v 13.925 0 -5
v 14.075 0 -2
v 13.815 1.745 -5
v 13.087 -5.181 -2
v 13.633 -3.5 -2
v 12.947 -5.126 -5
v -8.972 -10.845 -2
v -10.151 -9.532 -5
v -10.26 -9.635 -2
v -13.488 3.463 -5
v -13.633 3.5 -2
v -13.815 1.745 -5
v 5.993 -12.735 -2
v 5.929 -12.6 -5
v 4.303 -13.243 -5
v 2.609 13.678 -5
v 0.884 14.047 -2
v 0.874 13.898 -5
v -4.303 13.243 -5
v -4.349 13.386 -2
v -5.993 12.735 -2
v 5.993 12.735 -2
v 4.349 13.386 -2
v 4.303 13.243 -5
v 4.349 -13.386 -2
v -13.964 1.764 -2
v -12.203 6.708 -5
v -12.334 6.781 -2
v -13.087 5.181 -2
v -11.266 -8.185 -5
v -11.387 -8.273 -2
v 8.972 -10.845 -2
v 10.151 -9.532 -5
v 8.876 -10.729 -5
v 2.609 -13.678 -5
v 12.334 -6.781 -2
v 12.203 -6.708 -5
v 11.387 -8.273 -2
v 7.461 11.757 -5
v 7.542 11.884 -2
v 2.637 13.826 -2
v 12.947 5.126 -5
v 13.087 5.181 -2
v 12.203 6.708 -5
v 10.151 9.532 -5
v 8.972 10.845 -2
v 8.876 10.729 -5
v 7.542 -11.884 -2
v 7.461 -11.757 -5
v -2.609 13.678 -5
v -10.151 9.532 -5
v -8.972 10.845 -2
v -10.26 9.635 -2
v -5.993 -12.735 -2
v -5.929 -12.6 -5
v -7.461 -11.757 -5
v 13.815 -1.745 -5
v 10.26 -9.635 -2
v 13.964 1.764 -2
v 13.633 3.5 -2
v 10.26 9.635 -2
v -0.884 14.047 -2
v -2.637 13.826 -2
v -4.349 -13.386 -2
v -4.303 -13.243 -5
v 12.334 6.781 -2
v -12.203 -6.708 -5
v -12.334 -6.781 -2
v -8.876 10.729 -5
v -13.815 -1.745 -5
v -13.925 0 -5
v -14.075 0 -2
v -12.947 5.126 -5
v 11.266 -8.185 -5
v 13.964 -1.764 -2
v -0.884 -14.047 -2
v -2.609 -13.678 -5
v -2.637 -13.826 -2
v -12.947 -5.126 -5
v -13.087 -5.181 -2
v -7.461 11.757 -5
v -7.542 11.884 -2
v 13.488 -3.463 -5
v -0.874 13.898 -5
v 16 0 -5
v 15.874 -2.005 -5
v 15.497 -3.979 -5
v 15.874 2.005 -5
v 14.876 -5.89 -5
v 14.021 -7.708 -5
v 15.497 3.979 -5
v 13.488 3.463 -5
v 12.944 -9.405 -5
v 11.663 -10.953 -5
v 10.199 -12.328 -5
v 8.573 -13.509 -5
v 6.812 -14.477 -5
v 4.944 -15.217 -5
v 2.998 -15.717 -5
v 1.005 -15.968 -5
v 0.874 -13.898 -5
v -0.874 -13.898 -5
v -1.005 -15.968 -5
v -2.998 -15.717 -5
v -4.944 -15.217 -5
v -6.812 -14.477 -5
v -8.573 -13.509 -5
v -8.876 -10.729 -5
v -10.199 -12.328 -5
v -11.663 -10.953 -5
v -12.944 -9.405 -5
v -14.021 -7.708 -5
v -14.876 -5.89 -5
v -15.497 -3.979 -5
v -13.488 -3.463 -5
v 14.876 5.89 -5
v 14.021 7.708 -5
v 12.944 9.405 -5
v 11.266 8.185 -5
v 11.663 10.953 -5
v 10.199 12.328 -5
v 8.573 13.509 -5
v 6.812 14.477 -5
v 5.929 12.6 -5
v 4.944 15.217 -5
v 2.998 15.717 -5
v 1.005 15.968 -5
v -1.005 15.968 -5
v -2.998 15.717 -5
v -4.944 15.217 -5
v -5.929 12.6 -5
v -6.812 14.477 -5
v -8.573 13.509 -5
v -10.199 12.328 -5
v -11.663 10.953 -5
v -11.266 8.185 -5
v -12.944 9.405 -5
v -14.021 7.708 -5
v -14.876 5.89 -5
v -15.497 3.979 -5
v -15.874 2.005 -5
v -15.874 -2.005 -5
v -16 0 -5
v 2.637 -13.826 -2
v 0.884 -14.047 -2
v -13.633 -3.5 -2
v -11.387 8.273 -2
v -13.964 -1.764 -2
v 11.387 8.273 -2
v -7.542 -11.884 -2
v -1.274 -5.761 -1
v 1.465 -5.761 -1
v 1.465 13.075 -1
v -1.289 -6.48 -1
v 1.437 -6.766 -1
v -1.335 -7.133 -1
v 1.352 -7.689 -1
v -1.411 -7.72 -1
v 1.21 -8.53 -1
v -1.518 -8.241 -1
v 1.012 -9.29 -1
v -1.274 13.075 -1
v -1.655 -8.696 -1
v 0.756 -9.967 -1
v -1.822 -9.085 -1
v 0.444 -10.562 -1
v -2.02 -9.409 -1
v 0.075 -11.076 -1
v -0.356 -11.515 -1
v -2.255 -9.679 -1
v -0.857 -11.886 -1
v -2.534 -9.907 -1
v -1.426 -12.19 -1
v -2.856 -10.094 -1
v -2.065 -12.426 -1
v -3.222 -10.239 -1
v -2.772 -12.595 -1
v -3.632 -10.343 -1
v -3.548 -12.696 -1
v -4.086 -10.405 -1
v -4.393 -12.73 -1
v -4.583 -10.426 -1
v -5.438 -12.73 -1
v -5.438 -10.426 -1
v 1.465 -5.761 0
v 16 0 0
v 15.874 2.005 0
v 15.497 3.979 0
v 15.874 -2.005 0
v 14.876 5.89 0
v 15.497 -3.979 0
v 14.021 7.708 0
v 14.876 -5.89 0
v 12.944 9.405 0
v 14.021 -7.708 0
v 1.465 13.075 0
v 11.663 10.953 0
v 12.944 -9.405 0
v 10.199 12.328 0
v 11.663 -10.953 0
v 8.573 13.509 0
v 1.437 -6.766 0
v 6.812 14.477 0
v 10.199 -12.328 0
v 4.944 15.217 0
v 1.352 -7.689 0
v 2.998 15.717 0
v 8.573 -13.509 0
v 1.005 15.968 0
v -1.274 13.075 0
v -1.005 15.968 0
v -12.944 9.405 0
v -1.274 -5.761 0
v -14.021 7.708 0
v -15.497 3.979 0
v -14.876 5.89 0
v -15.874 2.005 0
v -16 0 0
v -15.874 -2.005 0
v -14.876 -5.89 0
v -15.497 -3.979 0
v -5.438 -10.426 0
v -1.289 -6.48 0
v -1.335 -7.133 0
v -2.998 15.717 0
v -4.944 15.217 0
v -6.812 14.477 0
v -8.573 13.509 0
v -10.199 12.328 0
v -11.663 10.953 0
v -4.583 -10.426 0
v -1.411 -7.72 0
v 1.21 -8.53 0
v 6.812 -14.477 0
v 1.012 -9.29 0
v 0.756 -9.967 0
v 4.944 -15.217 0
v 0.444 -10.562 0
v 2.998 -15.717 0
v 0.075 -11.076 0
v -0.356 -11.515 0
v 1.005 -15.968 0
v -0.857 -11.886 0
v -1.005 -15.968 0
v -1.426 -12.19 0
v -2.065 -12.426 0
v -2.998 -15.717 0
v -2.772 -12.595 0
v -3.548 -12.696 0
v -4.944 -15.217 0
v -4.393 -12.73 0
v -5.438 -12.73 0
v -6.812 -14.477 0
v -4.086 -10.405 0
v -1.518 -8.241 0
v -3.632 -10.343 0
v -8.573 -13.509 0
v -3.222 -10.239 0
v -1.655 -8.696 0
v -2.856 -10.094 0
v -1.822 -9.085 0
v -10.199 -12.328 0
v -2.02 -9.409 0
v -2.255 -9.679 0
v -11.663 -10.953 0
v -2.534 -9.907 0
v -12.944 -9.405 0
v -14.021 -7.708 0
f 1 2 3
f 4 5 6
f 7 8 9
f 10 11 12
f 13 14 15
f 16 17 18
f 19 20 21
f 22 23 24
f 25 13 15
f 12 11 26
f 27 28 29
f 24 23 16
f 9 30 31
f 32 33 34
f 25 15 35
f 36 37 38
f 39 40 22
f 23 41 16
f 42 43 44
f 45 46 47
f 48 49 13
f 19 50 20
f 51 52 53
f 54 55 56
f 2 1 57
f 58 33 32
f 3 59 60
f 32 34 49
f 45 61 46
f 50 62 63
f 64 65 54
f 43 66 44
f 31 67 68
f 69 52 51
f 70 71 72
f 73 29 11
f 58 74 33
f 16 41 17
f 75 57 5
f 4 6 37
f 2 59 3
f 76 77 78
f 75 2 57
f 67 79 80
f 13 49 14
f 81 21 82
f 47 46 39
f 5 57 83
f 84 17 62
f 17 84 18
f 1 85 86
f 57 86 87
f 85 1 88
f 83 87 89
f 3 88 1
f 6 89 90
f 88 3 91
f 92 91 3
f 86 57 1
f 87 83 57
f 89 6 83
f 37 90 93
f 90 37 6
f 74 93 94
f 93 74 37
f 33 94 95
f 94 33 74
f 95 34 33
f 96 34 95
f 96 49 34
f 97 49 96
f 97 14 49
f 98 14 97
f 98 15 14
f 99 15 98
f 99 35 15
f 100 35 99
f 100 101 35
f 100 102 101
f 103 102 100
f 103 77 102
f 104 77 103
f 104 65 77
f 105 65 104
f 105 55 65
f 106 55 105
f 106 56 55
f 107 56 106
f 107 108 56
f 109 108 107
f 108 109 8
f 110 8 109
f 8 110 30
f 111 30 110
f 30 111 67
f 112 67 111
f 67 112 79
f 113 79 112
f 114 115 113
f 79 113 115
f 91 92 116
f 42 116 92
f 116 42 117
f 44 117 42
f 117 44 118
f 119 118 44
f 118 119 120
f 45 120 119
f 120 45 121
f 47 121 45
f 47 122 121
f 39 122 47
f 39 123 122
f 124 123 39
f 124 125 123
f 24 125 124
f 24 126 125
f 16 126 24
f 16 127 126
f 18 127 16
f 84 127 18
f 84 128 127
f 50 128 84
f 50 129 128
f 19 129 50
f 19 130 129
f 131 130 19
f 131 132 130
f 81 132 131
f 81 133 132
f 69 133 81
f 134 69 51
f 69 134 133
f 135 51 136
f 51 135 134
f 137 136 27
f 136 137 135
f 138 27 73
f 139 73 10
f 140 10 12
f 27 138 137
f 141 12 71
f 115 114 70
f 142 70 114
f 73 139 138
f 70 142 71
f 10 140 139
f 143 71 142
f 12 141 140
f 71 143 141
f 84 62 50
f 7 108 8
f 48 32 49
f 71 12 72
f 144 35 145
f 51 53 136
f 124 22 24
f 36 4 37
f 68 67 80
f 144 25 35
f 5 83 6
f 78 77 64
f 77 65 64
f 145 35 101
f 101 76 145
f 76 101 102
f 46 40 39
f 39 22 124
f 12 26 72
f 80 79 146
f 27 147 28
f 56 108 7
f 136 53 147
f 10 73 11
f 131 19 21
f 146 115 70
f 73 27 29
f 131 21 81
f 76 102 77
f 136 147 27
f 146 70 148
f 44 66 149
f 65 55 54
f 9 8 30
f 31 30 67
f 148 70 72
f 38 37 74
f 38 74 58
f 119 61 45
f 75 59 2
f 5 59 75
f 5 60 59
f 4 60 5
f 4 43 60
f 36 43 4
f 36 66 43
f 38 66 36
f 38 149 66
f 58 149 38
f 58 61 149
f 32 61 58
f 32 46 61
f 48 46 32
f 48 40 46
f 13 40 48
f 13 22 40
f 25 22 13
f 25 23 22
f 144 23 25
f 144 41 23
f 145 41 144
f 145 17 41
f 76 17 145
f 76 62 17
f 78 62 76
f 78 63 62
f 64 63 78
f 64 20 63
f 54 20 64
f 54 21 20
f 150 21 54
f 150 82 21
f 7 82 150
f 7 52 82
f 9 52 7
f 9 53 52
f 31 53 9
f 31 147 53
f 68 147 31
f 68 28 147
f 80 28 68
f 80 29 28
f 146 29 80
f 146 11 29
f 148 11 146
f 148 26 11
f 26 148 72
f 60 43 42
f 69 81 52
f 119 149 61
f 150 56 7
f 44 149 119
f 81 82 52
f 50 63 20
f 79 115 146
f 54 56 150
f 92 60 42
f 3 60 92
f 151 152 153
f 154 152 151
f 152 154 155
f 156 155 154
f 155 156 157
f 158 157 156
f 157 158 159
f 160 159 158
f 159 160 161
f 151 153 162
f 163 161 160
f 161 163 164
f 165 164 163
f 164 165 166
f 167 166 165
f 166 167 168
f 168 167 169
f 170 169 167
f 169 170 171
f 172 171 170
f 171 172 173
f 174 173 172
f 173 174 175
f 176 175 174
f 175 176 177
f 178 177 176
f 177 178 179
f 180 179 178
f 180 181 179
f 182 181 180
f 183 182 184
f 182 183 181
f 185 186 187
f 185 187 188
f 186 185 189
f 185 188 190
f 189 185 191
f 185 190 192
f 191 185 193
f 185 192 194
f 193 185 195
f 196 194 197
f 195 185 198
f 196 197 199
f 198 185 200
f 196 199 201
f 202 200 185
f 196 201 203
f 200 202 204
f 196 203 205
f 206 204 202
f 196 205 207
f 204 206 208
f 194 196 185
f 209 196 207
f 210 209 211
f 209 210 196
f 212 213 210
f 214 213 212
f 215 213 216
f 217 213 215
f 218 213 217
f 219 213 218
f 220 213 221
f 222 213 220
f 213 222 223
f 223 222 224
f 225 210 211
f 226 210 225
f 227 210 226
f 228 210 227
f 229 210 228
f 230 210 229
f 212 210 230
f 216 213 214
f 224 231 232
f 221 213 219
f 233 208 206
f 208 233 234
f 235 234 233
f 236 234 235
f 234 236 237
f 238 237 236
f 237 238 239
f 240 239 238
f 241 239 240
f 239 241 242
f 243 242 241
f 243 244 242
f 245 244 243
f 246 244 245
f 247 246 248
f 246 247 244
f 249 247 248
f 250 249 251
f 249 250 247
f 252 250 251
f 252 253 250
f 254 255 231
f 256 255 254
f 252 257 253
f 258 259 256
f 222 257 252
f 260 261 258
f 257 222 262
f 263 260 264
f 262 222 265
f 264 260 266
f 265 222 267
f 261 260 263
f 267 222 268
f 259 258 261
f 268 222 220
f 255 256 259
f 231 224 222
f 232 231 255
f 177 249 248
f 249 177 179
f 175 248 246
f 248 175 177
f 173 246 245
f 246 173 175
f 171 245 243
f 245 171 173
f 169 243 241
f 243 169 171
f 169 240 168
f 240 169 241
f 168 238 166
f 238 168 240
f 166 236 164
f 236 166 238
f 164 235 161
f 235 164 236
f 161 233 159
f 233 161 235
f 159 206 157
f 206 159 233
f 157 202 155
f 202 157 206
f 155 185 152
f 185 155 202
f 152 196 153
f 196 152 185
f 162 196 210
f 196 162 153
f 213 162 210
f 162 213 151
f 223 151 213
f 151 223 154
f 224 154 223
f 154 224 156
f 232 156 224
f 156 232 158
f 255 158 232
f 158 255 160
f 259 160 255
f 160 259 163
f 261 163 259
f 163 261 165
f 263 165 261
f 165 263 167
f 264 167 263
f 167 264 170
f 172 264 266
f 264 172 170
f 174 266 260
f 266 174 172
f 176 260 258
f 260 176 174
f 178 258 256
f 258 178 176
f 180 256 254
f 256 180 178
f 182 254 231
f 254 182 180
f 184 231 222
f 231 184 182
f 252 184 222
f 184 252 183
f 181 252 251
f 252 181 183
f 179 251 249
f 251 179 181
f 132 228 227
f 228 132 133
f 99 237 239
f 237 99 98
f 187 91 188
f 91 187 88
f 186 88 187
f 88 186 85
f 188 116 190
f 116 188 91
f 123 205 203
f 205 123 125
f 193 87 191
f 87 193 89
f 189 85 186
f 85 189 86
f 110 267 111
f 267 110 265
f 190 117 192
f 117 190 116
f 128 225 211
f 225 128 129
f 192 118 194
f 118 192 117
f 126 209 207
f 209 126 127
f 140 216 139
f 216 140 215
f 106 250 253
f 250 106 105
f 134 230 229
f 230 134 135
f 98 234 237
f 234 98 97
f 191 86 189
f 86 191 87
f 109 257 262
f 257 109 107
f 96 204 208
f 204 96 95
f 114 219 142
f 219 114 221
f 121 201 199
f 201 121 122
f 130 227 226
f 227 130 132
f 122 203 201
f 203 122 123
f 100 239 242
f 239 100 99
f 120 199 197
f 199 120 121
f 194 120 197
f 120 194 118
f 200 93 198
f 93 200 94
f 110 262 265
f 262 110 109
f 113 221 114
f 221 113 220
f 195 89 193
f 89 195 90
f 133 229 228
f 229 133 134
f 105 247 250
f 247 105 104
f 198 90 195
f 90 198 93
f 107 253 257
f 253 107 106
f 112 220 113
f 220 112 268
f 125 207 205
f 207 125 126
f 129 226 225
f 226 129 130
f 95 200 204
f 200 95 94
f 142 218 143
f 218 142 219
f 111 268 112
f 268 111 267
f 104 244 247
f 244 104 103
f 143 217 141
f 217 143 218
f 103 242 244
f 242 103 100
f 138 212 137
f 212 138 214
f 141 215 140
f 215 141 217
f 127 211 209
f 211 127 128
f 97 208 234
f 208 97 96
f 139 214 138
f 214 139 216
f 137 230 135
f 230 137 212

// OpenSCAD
$fn = 50;


difference() {
	union() {
		translate(v = [0, 0, -5.0000000000]) {
			cylinder(h = 5, r = 16.0000000000);
		}
	}
	union() {
		#translate(v = [0, 0, -5.0000000000]) {
			cylinder(h = 3, r1 = 13.9250000000, r2 = 14.0750000000);
		}
		translate(v = [0, 0, -1]) {
			linear_extrude(height = 1) {
				text(font = "Impact", halign = "center", size = 20, text = "J", valign = "center");
			}
		}
	}
}
